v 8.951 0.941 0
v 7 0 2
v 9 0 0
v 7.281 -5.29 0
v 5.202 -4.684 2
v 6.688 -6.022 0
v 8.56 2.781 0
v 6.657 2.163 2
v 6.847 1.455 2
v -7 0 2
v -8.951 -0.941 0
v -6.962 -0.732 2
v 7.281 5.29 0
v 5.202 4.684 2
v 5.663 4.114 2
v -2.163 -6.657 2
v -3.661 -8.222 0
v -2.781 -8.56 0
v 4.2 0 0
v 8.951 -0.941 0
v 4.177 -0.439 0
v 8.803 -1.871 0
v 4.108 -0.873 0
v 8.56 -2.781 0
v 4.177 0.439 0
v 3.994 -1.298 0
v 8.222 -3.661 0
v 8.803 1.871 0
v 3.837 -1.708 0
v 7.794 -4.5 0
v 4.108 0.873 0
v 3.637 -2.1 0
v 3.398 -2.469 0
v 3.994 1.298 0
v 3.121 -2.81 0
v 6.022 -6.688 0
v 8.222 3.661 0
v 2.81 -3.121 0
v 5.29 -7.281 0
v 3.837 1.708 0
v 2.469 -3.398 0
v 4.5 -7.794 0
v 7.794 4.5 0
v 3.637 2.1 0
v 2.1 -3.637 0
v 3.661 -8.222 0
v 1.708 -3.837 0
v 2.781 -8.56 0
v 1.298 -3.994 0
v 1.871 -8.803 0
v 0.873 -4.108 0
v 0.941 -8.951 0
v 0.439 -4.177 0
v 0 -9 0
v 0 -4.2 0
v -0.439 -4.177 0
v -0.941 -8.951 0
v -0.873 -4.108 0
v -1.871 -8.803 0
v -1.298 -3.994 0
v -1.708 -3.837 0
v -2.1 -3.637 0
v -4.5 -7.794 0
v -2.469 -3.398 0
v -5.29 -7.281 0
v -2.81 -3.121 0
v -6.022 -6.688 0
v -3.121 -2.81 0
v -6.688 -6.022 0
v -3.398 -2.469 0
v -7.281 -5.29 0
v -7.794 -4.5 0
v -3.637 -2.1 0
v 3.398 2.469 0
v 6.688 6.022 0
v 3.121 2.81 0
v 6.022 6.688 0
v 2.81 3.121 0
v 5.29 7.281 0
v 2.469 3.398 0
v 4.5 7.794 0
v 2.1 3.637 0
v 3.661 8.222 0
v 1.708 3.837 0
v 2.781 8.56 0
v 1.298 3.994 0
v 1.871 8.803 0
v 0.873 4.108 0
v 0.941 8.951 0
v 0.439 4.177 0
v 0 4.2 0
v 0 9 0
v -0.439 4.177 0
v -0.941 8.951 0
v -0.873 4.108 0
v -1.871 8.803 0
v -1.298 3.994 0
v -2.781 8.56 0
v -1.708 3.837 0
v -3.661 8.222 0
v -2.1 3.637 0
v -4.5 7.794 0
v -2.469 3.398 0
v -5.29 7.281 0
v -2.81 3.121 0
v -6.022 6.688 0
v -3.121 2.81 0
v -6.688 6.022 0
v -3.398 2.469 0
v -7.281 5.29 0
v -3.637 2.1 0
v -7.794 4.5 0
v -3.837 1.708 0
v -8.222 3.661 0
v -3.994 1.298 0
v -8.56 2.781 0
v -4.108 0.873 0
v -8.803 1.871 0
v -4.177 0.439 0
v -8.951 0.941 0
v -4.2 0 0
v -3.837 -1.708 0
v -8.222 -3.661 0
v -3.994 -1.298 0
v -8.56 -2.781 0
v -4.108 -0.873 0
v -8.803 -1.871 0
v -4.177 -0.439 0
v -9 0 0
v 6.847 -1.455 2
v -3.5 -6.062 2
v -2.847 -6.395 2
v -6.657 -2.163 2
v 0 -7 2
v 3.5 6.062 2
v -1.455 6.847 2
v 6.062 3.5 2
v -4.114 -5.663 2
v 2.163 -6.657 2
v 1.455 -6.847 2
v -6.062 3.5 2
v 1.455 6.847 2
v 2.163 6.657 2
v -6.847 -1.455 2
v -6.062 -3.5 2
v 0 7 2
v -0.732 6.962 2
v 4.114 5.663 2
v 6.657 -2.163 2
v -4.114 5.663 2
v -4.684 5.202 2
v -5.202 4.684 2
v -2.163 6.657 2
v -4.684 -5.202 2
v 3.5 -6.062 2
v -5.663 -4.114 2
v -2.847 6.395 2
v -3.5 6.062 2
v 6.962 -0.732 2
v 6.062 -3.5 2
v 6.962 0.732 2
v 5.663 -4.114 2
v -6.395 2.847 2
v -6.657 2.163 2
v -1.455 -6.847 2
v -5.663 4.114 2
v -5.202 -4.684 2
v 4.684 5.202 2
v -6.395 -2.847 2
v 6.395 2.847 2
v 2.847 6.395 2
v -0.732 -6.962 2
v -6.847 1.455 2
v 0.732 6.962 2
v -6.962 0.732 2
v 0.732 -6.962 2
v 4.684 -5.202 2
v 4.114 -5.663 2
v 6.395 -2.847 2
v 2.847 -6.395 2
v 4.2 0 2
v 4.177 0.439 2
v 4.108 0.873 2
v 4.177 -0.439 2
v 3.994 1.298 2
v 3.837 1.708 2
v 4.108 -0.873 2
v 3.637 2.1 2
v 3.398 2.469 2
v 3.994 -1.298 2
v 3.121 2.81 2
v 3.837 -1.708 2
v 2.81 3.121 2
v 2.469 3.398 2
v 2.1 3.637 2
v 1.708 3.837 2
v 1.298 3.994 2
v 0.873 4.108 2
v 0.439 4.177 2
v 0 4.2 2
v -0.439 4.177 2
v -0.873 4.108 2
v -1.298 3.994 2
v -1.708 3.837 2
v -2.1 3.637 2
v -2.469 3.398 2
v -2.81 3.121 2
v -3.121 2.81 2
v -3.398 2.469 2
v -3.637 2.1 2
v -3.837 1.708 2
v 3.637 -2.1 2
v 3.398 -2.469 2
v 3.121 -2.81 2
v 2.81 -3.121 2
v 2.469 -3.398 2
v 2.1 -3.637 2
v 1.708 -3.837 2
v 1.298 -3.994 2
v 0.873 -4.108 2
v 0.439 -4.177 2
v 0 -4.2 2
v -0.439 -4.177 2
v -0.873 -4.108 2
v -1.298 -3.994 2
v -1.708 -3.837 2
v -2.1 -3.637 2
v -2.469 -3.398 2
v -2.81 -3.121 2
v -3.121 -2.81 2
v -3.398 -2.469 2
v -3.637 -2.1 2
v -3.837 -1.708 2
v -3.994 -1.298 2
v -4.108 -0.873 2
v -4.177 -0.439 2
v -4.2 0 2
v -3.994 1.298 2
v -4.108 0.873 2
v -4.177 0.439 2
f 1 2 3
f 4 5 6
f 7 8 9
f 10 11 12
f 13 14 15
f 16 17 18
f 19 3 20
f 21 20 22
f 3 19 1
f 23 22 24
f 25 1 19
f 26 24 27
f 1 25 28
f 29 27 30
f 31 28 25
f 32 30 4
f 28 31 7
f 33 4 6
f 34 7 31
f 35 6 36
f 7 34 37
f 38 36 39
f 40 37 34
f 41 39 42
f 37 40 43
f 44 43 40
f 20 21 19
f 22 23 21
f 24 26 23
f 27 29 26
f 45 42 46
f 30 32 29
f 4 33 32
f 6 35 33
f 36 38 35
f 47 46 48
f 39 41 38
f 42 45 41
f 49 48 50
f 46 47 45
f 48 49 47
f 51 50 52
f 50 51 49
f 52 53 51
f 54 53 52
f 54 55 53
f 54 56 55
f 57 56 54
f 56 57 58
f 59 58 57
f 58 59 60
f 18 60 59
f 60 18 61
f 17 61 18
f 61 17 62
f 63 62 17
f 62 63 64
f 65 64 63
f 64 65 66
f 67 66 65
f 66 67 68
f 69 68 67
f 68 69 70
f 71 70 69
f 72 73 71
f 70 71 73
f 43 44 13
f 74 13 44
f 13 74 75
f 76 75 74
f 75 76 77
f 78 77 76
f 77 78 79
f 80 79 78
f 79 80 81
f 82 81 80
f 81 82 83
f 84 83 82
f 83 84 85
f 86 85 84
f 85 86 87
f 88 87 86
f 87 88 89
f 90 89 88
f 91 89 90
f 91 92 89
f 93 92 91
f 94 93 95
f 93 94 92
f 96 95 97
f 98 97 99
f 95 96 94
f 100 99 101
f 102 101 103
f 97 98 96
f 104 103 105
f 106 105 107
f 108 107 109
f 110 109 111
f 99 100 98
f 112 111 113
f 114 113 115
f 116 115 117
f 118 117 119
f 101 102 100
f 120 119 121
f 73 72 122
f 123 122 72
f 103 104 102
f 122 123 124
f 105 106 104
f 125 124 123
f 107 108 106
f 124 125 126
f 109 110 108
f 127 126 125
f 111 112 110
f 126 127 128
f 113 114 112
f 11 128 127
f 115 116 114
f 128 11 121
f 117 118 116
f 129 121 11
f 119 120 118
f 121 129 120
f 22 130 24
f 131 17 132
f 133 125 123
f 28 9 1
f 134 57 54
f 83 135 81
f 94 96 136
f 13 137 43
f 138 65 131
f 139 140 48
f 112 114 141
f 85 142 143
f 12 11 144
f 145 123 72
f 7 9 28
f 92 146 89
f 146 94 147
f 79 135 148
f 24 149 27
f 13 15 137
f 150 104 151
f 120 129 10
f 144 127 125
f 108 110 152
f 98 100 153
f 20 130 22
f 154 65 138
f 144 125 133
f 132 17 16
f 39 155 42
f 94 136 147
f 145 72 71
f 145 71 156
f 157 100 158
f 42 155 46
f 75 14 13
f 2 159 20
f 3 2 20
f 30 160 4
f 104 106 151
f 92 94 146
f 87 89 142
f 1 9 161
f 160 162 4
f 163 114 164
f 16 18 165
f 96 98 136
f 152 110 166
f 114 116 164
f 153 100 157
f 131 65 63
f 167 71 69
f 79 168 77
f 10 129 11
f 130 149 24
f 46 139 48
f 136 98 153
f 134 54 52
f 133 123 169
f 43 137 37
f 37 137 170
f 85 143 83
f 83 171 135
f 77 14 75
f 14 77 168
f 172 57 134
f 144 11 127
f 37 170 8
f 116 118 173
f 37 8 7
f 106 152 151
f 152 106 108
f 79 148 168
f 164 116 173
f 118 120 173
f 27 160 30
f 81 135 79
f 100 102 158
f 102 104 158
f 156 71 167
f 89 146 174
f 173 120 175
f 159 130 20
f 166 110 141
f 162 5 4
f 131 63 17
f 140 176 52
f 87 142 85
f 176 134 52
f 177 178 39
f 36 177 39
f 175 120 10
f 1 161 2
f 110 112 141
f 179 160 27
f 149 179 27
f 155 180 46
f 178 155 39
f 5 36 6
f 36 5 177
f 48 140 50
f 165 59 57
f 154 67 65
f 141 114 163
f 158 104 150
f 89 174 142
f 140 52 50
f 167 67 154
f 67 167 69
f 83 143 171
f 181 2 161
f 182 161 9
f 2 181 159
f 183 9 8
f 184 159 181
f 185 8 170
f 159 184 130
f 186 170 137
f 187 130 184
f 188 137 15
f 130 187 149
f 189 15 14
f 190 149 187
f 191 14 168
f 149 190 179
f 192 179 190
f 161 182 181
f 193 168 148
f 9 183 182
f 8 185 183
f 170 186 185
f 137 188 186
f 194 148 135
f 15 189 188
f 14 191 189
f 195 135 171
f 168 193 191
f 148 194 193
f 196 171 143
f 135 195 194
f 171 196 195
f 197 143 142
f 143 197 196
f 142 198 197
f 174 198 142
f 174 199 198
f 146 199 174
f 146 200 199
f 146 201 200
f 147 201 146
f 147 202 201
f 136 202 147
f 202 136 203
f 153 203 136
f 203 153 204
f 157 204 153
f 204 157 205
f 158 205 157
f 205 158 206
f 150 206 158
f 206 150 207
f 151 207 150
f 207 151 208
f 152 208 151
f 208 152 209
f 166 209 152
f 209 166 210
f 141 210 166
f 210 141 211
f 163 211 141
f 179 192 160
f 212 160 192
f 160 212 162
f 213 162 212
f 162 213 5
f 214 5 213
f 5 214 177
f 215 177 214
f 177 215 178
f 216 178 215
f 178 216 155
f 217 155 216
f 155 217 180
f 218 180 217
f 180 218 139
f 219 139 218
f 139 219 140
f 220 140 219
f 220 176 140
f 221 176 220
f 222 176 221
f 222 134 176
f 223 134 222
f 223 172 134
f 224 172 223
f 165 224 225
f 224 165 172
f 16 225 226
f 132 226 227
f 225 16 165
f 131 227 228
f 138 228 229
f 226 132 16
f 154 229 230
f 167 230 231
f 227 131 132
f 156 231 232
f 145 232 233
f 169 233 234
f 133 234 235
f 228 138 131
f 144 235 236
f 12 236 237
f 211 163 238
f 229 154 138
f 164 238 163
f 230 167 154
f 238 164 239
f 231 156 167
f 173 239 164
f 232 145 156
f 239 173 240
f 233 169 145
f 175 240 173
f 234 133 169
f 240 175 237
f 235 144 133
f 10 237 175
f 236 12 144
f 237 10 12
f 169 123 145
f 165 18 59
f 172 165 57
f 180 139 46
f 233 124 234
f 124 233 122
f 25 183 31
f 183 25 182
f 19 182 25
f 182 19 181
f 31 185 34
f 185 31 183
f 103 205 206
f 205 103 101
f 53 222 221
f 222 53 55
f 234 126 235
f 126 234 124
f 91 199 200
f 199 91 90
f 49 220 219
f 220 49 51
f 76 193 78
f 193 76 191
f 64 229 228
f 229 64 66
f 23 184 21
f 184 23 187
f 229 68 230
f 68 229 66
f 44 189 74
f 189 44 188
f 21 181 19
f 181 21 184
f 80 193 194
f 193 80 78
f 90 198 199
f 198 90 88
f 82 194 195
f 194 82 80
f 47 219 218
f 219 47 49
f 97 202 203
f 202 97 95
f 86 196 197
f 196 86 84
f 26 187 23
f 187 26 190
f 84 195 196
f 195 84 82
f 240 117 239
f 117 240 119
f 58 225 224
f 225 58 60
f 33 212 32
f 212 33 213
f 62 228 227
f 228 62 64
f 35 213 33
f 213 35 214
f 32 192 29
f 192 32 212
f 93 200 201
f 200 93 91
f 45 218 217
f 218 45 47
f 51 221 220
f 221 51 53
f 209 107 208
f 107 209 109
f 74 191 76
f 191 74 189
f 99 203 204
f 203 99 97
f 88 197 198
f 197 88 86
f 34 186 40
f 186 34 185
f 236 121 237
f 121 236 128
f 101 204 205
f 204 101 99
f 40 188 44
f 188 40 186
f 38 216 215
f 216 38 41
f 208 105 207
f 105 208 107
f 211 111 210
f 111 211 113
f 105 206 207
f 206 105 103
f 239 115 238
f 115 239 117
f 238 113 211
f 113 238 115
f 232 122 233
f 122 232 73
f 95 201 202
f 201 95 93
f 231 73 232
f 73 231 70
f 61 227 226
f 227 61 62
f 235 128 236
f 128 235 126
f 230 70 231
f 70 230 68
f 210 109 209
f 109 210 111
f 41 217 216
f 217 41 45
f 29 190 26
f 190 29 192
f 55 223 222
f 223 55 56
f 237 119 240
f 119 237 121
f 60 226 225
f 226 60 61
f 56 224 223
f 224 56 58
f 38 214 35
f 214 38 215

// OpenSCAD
// Conical spring washer.
$fn = 60;
eps = 0.02;
inner_d = 8.4;
outer_d = 18;
thickness = 2;
difference() {
    cylinder(d1=outer_d,d2=outer_d-2*thickness,h=thickness);
    translate([0,0,-eps]) cylinder(d=inner_d,h=thickness+2*eps);
}
